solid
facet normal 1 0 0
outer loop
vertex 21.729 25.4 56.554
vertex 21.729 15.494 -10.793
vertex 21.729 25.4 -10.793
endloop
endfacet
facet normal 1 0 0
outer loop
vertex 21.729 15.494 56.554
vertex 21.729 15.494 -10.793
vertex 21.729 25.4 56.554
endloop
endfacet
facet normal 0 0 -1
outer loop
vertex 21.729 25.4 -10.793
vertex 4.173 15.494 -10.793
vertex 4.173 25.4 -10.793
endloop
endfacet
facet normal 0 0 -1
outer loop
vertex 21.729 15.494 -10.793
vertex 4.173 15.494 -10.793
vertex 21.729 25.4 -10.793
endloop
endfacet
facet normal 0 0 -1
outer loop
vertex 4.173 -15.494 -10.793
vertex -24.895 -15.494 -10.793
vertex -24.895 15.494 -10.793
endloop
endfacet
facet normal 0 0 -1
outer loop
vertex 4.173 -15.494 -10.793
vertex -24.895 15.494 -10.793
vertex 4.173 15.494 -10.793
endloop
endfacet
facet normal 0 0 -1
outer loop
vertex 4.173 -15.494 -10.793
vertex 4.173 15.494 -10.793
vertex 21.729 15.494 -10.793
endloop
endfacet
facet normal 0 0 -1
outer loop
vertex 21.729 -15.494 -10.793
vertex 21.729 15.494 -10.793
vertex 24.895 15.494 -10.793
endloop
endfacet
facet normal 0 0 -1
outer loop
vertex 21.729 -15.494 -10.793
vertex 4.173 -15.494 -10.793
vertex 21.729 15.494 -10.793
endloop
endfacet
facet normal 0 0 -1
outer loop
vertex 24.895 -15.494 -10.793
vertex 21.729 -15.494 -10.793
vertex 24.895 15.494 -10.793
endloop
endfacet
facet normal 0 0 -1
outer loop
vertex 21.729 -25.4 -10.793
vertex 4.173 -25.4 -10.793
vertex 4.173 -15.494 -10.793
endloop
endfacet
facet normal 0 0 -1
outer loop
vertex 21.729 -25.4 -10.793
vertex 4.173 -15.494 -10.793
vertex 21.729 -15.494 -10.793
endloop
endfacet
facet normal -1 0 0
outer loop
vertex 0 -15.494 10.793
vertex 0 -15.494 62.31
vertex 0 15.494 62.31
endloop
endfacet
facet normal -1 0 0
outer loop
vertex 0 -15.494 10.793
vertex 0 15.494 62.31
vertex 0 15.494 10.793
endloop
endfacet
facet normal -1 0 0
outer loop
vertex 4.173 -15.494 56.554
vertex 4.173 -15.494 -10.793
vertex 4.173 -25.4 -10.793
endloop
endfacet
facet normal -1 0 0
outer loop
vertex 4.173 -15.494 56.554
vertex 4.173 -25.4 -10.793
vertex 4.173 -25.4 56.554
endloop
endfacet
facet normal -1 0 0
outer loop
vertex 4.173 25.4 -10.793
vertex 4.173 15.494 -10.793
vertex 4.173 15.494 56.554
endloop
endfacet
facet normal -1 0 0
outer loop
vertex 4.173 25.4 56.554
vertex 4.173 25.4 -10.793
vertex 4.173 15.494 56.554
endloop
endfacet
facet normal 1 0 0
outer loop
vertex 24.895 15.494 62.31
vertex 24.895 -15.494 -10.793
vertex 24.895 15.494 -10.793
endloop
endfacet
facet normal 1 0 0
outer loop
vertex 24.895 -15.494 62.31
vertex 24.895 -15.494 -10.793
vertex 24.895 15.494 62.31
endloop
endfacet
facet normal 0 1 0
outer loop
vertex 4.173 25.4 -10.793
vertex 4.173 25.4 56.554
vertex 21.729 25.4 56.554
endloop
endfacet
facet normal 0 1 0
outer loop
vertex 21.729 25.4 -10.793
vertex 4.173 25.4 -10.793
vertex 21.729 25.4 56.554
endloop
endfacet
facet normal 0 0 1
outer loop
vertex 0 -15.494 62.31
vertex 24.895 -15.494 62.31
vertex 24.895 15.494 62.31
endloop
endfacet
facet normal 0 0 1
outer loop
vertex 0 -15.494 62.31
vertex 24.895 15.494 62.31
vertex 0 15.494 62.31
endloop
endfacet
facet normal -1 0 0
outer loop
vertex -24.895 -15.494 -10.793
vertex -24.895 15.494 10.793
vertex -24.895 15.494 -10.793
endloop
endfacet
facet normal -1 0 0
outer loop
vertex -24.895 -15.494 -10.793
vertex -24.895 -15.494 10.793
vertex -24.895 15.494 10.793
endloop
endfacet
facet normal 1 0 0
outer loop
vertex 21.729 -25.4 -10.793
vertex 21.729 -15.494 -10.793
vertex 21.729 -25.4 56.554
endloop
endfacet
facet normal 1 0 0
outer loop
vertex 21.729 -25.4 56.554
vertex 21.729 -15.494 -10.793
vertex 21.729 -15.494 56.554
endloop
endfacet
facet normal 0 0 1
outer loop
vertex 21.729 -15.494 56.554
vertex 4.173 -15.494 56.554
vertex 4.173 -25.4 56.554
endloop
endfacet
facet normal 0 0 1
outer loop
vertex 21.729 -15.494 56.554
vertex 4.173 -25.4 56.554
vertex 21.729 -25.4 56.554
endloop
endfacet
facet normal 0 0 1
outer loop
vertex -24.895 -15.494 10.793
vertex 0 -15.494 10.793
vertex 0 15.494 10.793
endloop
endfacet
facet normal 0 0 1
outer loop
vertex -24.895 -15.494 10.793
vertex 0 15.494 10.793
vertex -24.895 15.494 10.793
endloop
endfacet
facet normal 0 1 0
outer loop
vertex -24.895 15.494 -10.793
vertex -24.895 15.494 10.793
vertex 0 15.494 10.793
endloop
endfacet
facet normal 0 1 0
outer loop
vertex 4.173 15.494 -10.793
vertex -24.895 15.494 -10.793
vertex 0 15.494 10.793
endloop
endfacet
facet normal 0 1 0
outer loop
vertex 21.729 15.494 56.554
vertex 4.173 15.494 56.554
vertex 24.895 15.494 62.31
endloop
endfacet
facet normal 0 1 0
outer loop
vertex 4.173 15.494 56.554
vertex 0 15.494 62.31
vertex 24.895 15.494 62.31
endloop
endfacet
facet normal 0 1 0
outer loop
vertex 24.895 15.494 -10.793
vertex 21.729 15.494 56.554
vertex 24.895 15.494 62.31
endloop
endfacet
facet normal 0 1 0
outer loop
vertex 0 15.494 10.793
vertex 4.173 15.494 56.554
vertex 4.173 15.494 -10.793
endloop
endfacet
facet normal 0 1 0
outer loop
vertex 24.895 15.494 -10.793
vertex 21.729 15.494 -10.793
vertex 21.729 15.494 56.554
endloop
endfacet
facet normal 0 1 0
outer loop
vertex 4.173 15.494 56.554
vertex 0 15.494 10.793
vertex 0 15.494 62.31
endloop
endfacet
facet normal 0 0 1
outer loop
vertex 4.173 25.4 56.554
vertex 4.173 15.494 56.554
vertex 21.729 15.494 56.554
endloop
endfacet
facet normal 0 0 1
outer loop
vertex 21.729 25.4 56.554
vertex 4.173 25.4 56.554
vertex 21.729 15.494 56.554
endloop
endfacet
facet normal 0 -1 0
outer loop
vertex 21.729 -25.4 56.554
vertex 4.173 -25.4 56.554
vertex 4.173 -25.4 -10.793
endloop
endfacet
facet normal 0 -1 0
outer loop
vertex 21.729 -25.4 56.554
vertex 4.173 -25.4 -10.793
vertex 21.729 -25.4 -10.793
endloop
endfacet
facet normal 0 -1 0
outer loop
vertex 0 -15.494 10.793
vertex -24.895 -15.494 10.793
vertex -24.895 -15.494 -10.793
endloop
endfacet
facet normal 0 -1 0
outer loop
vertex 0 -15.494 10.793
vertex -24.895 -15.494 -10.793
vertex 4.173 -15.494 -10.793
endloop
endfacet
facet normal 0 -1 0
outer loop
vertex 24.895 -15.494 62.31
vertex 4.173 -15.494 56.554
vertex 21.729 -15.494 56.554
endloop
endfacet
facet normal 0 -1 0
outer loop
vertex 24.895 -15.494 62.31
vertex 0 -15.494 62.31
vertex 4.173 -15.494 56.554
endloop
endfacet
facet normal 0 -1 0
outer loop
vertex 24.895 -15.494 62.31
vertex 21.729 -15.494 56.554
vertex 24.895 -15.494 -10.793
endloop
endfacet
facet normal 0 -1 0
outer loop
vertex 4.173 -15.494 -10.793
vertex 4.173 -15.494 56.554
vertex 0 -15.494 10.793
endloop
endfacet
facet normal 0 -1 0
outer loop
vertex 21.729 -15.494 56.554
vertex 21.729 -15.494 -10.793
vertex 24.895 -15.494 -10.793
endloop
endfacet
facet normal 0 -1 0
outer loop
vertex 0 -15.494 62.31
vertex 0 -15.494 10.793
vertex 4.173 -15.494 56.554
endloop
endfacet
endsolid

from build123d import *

# Parameters (mm, degrees)
F0_W     = 3.1658634543
F0_H     = 21.5854328126
F1_DEPTH = 15.494
F0_W_2   = 17.5561509095
F0_H_2   = 45.7611167803
F2_DEPTH = 25.4
F3_DEPTH = 25.4


with BuildPart() as f1:
    # F0 (on Front) → F1 (new body)
    with BuildSketch(Plane.XZ):
        Polygon((0, 10.7927164063), (-24.8951986432, 10.7927164063), (-24.8951986432, -10.7927164063), (4.1731842794, -10.7927164063), (4.1731842794, 10.7927164063), align=None)
        with Locations((23.312266916, 0)):
            Rectangle(F0_W, F0_H)
        Polygon((0, 62.3099505901), (0, 10.7927164063), (4.1731842794, 10.7927164063), (4.1731842794, 56.5538331866), (21.7293351889, 56.5538331866), (21.7293351889, 10.7927164063), (24.8951986432, 10.7927164063), (24.8951986432, 62.3099505901), align=None)
    extrude(amount=F1_DEPTH)

    # F0 (on Front) → F2 (join)
    with BuildSketch(Plane.XZ):
        with Locations((12.9512597341, 33.6732747965)):
            Rectangle(F0_W_2, F0_H_2)
    extrude(amount=F2_DEPTH)

    # F0 (on Front) → F3 (join)
    with BuildSketch(Plane.XZ):
        with Locations((12.9512597341, 0)):
            Rectangle(F0_W_2, F0_H)
    extrude(amount=F3_DEPTH)

    # F4: F1 across plane


with BuildPart() as f1_1:
    add(f1.part)
    add(f1.part.mirror(Plane.XZ))


solid = f1_1.part
